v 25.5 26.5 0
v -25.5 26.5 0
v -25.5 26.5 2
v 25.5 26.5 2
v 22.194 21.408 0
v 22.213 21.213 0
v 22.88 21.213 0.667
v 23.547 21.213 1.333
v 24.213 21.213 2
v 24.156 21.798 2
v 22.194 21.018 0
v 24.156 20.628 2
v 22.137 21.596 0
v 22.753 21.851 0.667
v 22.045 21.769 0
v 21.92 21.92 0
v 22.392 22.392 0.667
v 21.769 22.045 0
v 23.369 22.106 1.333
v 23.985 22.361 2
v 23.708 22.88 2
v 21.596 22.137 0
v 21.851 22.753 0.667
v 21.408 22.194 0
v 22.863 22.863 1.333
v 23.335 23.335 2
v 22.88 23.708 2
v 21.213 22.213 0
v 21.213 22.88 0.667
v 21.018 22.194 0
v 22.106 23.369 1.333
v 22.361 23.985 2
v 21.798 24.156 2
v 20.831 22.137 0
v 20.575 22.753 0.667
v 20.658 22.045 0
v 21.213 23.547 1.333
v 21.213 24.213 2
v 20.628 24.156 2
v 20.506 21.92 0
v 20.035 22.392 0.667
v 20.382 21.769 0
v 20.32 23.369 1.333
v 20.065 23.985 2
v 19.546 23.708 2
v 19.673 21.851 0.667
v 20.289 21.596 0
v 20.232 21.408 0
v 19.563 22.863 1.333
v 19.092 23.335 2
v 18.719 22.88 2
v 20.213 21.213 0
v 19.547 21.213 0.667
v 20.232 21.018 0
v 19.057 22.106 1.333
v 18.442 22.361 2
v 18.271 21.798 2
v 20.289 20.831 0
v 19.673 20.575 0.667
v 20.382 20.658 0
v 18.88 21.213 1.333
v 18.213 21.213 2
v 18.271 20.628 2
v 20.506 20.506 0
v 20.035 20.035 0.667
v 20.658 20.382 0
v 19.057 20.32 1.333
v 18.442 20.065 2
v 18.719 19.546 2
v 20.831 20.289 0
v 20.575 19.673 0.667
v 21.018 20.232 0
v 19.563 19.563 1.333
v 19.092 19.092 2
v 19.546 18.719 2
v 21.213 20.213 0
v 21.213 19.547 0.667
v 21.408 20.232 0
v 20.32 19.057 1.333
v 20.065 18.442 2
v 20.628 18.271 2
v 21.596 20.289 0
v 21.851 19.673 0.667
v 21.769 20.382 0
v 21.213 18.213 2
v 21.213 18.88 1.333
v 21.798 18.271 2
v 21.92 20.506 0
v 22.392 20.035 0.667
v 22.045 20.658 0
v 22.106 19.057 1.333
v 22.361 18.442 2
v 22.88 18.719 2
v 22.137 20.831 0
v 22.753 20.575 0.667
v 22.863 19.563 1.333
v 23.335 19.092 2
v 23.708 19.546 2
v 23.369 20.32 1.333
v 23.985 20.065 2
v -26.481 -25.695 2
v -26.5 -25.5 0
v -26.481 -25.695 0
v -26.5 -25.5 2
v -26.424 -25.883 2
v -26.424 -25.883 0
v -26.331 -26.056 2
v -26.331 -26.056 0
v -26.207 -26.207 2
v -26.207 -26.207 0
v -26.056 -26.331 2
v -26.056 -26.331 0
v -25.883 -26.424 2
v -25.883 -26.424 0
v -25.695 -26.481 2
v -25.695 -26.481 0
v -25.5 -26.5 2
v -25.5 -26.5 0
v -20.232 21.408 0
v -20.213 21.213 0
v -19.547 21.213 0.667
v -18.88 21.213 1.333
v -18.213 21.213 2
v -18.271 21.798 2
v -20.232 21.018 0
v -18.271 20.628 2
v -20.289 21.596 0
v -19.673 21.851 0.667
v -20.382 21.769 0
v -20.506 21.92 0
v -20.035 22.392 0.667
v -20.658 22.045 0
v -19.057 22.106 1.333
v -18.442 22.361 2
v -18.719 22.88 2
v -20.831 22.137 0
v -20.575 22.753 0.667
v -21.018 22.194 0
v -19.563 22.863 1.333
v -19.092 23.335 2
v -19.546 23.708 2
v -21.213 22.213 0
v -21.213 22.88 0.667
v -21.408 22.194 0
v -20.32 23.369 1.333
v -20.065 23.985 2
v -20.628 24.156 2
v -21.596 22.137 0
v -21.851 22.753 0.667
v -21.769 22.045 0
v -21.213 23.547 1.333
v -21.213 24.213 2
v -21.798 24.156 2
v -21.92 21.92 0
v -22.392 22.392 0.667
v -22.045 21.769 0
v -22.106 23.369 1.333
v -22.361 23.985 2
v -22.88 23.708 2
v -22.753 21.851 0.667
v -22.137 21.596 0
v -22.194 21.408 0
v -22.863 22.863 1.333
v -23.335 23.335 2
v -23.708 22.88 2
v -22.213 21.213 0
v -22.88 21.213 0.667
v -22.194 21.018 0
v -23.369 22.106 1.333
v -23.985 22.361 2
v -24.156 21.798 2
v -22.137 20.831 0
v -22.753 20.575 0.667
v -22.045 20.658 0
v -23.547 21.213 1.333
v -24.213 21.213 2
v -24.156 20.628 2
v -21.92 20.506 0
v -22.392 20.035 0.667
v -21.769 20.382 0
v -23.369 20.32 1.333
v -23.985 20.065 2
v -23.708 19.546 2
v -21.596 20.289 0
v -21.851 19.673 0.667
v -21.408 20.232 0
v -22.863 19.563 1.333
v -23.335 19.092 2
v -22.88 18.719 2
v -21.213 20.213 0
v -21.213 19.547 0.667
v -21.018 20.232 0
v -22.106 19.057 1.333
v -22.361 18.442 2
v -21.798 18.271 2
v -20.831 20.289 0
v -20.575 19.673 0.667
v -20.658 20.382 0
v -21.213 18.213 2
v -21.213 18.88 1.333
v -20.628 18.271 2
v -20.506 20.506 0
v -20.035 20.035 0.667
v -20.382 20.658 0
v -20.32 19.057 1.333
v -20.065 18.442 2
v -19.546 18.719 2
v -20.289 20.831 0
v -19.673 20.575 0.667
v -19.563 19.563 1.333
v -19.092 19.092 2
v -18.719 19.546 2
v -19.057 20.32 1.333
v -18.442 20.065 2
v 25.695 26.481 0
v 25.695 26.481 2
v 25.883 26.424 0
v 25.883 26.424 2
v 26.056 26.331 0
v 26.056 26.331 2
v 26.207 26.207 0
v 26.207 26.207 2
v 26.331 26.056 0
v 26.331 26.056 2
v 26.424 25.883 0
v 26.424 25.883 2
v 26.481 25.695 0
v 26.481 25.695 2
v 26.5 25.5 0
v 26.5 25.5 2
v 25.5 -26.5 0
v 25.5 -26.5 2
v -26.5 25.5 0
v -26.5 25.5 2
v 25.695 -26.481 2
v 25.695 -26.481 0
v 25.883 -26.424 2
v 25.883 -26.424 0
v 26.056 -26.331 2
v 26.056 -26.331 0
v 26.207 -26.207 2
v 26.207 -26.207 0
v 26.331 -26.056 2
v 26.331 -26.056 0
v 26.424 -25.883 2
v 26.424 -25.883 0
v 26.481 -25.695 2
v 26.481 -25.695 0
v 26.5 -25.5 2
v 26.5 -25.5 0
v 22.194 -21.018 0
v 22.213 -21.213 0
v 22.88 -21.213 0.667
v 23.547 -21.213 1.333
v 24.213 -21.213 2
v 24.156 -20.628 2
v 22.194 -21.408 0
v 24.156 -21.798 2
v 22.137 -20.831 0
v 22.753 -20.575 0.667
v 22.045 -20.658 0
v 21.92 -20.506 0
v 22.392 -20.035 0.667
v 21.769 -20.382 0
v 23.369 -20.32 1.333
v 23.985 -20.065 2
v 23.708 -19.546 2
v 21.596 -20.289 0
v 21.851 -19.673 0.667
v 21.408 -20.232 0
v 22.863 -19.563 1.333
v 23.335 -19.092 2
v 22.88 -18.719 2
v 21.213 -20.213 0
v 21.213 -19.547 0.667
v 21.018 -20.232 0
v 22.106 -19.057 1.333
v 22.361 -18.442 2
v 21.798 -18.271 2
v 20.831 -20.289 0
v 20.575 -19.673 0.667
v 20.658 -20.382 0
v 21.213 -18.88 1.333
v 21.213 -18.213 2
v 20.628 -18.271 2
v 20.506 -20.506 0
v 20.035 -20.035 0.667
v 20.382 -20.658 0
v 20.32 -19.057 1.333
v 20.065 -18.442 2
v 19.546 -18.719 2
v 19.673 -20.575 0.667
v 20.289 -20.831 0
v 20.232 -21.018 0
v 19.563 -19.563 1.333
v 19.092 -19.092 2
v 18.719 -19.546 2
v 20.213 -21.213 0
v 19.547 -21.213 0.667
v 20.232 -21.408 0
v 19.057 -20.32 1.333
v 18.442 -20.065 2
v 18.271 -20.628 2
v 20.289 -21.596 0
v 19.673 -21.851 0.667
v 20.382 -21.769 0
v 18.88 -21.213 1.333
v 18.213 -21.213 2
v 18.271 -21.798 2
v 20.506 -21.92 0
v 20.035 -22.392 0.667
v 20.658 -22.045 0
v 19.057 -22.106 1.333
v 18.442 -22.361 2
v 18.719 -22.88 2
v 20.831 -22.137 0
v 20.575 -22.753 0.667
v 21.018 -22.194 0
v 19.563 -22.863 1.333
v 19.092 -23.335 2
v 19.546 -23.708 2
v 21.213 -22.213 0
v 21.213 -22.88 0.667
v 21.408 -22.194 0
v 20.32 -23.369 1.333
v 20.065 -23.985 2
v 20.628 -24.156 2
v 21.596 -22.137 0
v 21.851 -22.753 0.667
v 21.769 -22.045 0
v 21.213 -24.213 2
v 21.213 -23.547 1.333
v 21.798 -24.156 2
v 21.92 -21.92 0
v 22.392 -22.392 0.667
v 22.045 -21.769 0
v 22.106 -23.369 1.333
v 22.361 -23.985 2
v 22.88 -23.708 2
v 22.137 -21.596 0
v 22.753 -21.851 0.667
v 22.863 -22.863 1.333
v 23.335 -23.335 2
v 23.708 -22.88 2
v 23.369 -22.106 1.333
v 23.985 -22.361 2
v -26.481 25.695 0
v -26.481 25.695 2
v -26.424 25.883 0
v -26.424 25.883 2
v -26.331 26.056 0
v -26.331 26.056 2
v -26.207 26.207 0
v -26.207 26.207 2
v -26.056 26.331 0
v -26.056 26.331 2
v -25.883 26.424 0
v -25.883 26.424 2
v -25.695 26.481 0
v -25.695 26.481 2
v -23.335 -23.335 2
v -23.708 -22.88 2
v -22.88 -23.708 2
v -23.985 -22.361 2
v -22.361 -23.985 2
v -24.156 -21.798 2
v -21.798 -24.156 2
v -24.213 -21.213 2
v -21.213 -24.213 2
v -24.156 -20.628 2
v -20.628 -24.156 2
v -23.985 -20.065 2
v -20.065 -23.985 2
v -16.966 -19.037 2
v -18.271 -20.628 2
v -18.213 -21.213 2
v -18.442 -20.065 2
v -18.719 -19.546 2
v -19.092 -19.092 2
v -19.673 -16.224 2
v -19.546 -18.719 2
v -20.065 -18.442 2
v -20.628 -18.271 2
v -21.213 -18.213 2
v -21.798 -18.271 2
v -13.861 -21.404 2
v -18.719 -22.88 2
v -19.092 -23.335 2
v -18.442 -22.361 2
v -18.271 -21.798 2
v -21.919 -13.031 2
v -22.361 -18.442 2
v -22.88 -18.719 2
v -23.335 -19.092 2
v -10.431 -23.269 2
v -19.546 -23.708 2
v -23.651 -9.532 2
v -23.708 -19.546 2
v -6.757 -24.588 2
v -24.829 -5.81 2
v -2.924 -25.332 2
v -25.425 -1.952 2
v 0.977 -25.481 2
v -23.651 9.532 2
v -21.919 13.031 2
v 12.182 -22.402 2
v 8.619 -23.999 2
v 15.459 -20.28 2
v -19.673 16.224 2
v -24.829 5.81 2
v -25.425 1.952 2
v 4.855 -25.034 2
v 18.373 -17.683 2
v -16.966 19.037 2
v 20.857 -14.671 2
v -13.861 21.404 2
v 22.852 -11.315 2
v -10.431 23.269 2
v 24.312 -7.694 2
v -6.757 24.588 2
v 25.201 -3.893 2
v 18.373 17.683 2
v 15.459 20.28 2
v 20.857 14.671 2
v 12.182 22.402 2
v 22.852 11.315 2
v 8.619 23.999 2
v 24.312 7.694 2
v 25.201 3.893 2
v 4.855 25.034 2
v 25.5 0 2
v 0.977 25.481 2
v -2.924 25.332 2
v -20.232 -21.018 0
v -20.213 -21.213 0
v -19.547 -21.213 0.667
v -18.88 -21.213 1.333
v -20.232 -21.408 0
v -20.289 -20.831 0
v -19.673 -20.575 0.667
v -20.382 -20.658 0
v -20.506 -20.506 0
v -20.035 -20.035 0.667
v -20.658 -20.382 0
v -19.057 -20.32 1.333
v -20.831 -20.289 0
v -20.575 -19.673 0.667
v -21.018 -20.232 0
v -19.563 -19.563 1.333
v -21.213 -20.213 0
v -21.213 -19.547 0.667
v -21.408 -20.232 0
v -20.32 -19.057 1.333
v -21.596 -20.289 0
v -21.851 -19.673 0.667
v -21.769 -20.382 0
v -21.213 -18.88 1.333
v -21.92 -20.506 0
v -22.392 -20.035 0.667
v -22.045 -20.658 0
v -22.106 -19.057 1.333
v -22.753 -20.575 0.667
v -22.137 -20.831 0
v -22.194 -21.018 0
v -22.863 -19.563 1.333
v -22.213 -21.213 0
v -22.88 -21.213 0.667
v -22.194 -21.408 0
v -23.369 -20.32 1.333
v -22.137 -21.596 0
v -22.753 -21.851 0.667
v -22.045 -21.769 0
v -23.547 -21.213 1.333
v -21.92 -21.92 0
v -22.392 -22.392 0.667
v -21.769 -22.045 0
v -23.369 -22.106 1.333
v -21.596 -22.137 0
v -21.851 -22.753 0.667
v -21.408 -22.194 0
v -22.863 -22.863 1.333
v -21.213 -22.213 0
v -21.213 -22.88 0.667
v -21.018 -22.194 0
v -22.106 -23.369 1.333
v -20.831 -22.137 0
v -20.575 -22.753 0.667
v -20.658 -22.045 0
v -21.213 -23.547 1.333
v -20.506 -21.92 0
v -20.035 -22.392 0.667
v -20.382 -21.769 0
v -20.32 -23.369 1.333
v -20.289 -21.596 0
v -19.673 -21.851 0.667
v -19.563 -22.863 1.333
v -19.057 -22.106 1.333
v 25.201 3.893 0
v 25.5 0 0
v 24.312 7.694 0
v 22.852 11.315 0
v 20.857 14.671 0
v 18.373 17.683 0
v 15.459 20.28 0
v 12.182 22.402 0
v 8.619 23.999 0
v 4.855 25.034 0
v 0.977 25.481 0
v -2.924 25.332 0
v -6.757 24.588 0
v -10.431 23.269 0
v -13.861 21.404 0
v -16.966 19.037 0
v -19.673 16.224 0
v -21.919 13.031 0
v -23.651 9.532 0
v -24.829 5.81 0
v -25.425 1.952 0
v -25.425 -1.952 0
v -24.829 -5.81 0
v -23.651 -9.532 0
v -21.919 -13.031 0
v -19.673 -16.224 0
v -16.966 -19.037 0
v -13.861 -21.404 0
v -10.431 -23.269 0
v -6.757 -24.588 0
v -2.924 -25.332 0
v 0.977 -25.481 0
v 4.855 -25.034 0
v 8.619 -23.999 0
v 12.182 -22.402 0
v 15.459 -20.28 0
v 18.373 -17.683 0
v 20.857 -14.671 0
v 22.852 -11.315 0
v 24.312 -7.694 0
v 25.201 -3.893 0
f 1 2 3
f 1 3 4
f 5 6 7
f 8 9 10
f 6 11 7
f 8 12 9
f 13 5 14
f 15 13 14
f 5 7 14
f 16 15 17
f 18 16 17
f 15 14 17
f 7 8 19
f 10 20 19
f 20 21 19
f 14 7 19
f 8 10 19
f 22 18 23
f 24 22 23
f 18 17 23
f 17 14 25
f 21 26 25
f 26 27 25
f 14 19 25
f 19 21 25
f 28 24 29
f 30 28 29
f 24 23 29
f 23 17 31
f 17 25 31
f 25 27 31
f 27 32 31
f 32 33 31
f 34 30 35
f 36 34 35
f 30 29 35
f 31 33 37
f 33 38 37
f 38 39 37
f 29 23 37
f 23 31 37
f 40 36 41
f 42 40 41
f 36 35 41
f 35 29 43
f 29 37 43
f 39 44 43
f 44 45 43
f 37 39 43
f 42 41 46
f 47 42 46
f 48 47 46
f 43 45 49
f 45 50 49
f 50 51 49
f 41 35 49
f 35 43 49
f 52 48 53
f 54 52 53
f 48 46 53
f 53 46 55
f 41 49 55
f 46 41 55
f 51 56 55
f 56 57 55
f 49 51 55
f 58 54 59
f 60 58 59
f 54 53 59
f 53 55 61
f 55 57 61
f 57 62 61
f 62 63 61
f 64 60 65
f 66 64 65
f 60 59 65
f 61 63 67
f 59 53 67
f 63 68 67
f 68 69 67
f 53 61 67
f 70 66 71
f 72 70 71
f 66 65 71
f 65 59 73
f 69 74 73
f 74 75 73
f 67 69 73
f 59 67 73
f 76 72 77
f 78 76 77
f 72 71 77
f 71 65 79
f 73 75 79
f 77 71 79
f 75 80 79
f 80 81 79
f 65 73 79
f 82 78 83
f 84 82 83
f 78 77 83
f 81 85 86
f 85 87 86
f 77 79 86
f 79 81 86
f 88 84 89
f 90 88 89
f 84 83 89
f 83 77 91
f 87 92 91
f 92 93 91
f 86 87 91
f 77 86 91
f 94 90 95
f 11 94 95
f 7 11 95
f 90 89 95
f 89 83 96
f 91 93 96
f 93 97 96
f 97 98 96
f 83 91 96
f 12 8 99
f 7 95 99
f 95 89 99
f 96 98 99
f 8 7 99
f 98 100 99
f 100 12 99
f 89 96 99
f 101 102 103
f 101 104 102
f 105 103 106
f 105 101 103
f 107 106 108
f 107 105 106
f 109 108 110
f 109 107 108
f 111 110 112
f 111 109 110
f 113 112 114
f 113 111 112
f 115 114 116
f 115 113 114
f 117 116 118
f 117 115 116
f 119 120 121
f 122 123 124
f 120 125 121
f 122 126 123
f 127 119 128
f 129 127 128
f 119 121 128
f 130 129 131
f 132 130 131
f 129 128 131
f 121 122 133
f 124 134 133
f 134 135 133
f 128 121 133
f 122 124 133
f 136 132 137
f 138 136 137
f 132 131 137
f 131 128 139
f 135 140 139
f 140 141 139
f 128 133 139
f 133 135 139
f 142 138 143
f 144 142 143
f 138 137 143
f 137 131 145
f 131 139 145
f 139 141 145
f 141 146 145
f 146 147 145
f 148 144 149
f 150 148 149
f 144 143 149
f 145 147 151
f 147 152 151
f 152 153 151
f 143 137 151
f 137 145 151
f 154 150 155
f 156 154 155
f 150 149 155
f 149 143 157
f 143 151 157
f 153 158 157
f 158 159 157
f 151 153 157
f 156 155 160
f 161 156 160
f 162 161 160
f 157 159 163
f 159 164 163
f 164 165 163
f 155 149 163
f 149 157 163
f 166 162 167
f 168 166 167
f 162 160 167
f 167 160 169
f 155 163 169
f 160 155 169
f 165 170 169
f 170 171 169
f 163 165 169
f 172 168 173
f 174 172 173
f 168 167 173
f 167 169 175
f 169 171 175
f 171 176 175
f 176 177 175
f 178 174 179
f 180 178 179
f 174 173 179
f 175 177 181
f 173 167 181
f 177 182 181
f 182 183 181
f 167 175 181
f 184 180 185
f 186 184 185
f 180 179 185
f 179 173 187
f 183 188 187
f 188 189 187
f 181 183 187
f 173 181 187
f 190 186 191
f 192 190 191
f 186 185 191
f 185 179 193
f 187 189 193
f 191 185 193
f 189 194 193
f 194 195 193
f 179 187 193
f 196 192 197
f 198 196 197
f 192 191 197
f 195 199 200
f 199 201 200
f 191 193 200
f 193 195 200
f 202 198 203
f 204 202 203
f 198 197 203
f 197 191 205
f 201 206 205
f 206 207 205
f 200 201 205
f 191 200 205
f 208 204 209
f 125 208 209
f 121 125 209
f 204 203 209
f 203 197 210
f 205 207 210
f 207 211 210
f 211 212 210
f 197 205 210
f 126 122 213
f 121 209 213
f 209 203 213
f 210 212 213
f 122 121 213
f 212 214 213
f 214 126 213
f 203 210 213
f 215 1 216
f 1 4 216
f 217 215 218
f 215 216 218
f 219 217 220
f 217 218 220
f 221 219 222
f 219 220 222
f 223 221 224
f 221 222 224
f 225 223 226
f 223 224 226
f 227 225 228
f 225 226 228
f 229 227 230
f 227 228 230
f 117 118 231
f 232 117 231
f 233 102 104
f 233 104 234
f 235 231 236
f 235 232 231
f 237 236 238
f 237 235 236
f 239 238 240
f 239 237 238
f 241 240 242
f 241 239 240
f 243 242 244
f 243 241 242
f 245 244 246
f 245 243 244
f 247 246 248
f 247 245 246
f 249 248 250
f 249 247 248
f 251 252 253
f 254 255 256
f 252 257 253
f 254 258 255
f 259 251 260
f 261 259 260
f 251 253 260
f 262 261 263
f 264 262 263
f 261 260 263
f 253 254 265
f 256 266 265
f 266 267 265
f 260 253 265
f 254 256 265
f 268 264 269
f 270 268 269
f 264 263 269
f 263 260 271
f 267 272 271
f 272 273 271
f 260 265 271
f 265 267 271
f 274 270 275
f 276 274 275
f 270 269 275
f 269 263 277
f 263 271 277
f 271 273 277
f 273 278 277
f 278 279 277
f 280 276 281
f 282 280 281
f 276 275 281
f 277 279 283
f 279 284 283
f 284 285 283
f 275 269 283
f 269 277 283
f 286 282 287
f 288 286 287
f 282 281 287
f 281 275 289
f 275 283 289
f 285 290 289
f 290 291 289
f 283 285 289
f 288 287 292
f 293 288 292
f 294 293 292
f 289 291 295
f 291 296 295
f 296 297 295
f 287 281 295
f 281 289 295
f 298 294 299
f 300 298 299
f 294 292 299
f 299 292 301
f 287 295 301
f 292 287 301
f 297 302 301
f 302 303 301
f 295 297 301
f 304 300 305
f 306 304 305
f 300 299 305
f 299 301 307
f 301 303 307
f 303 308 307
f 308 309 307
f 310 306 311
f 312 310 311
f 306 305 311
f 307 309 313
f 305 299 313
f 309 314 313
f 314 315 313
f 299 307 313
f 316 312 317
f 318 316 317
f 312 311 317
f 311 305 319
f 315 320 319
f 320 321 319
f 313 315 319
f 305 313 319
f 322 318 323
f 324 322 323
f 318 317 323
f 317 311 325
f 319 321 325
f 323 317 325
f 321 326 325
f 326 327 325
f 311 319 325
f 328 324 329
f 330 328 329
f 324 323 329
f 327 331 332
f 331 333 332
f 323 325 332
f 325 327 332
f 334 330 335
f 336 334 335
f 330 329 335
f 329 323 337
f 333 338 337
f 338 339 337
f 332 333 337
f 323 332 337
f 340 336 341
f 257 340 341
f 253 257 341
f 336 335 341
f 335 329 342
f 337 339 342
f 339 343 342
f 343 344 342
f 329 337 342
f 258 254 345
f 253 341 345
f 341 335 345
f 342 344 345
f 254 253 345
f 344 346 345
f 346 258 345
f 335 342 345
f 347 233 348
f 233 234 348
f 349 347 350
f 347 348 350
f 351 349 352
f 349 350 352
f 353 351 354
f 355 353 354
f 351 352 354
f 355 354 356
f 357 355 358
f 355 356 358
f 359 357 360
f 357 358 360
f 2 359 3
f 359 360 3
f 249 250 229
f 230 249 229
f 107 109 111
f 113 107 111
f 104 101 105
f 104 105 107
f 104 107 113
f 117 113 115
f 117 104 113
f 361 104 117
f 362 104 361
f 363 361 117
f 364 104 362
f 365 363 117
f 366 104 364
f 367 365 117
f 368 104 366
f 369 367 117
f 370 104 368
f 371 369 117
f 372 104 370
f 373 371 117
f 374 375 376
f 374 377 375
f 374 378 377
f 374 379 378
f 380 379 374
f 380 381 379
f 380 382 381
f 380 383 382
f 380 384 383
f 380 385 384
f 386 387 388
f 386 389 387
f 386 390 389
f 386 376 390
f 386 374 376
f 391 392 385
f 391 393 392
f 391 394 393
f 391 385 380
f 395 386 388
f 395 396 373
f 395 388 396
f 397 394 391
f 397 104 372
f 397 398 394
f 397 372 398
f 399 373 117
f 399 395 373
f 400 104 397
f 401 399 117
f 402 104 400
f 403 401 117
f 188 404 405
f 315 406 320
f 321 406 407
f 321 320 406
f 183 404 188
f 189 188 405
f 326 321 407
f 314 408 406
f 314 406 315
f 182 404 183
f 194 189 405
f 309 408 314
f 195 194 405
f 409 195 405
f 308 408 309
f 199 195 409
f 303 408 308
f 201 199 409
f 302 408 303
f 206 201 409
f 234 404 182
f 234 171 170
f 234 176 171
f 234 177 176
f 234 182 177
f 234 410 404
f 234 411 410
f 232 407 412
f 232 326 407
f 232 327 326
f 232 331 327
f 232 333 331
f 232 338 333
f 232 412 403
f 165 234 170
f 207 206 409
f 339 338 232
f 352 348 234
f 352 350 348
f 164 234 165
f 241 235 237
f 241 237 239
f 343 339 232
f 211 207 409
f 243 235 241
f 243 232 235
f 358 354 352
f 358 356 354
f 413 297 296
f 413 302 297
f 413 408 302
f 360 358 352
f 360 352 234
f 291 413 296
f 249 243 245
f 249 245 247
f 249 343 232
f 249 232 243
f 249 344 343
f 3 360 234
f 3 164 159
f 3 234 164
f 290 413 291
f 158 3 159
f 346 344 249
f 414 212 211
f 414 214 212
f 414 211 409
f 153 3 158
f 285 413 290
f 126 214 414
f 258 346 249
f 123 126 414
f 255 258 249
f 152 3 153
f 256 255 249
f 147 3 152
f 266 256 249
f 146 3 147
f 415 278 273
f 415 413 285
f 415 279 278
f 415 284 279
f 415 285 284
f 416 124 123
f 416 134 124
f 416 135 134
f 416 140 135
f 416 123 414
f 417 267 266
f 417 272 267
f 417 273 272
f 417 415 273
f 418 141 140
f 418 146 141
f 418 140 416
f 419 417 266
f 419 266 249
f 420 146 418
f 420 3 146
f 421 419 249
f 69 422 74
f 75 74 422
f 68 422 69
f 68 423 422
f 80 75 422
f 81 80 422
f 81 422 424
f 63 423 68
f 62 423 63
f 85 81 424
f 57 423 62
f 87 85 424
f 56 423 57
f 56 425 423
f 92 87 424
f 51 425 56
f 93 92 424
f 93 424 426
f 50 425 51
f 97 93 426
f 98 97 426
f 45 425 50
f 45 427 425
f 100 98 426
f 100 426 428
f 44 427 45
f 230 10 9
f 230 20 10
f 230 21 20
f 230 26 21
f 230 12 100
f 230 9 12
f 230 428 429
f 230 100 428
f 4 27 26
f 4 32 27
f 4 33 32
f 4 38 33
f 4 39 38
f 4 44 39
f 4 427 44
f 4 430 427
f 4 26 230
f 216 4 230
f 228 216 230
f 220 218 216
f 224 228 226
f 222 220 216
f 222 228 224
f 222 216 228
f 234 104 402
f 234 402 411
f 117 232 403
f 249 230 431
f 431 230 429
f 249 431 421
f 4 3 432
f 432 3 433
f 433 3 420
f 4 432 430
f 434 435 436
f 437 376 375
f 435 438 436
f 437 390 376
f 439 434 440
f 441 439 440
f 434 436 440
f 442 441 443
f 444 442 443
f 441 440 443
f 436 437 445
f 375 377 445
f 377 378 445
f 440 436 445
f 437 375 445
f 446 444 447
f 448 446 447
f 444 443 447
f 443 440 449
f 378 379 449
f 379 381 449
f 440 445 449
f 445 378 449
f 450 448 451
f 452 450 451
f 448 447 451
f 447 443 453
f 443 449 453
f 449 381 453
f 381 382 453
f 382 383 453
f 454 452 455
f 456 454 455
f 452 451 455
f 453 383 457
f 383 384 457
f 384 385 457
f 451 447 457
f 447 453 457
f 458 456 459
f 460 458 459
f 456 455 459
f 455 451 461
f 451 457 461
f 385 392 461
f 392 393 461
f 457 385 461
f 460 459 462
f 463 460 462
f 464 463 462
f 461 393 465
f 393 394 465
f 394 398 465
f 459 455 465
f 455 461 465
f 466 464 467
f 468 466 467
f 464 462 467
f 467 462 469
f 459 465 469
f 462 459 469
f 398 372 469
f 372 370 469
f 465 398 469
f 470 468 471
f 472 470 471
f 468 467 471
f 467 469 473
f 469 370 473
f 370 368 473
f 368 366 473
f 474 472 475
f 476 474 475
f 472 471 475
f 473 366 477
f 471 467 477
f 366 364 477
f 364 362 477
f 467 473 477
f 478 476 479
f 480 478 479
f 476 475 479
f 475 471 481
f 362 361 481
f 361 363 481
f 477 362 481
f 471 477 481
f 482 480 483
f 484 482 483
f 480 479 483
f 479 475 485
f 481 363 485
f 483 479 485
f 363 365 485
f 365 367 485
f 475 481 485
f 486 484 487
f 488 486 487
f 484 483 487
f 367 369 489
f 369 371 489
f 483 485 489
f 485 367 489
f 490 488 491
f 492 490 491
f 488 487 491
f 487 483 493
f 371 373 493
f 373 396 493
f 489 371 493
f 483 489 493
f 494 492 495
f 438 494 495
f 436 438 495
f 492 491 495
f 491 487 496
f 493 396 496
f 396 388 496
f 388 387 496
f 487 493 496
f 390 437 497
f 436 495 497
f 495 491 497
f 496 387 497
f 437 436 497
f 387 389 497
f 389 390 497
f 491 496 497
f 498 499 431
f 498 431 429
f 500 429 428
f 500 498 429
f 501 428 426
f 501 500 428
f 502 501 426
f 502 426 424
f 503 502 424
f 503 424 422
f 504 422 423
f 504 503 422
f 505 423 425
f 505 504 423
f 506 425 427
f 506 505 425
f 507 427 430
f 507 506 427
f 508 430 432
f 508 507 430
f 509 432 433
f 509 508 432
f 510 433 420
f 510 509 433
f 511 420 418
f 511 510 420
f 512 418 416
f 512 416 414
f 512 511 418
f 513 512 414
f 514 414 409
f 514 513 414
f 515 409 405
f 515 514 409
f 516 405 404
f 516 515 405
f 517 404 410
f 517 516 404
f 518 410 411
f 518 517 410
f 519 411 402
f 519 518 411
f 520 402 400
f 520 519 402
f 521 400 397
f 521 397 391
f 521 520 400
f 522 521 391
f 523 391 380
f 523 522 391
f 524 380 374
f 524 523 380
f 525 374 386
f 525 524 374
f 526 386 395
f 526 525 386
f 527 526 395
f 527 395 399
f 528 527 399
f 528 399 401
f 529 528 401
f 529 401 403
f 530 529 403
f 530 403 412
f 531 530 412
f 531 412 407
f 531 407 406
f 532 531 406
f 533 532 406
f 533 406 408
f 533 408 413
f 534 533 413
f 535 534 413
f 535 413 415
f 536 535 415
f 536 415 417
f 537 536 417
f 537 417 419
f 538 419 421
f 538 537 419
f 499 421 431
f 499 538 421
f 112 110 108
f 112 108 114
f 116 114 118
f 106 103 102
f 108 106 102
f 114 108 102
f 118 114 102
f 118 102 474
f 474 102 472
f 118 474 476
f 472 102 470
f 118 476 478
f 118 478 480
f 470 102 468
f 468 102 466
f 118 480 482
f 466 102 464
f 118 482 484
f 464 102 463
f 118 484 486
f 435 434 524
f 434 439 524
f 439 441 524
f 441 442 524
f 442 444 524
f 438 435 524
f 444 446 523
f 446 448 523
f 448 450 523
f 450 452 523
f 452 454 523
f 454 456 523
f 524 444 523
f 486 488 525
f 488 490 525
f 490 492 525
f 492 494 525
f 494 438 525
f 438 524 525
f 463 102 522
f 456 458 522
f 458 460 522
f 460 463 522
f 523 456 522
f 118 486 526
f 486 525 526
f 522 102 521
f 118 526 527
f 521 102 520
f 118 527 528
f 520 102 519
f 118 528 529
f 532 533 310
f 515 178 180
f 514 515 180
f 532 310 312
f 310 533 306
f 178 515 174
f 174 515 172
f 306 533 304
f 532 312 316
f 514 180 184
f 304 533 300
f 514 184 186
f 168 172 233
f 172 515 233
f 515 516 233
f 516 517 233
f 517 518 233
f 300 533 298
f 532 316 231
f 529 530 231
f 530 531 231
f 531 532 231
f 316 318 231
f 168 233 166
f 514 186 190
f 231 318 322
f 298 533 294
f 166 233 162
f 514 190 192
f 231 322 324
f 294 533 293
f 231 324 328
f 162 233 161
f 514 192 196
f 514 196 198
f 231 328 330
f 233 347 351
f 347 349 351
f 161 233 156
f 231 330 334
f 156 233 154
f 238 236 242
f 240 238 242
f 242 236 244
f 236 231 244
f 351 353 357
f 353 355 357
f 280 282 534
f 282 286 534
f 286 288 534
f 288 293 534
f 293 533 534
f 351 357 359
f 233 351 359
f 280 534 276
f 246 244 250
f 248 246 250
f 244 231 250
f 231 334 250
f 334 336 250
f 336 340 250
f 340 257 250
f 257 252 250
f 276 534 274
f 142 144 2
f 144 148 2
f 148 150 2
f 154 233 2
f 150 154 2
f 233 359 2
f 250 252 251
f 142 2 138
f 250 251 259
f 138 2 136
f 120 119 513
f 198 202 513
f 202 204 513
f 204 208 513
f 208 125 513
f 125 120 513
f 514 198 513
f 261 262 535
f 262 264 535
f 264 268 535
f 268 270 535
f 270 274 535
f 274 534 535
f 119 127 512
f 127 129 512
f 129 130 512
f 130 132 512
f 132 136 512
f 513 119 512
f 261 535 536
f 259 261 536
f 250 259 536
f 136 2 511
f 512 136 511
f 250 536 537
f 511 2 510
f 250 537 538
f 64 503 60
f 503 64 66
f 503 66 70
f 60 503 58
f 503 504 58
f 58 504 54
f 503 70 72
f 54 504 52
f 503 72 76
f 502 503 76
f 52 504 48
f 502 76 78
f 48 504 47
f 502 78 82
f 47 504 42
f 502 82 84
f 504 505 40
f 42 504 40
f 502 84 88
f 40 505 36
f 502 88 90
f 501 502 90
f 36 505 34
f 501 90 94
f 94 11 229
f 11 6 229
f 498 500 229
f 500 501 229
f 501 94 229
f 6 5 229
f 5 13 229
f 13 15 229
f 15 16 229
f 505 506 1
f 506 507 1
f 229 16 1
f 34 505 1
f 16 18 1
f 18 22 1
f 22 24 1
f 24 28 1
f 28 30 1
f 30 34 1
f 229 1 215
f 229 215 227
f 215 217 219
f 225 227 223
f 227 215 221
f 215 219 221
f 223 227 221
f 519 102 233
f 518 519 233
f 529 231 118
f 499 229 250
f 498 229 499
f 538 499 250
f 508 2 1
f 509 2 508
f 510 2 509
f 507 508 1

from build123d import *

# Parameters (mm, degrees)
F0_W     = 53
F0_H     = 53
F0_R     = 1
F0_R_2   = 25.5
F1_DEPTH = 2
F2_SIZE  = 1.99999
F3_R     = 1


# Not quite as in the source:
# - a fillet or chamfer is up to 0.001 mm smaller than in the source, because OpenCascade refuses the exact size


with BuildPart() as f1:
    # F0 (on Top) → F1 (new body)
    with BuildSketch(Plane.XY):
        Rectangle(F0_W, F0_H)
        with Locations((-21.2132034356, -21.2132034356)):
            Circle(F0_R, mode=Mode.SUBTRACT)
        with Locations((21.2132034356, -21.2132034356)):
            Circle(F0_R, mode=Mode.SUBTRACT)
        with Locations((-21.2132034356, 21.2132034356)):
            Circle(F0_R, mode=Mode.SUBTRACT)
        Circle(F0_R_2, mode=Mode.SUBTRACT)
        with Locations((21.2132034356, 21.2132034356)):
            Circle(F0_R, mode=Mode.SUBTRACT)
    extrude(amount=F1_DEPTH)

    # F2 (size 2 in the source; OpenCascade refuses exactly that, so slightly less here)
    f2_edges = [f1.edges().sort_by_distance(p)[0] for p in [
        (-22.213203, 21.213203, 2),
        (20.213203, 21.213203, 2),
        (20.213203, -21.213203, 2),
        (-22.213203, -21.213203, 2),
    ]]
    chamfer(f2_edges, length=F2_SIZE)

    # F3
    f3_edges = [f1.edges().sort_by_distance(p)[0] for p in [
        (26.5, -26.5, 1),
        (26.5, 26.5, 1),
        (-26.5, -26.5, 1),
        (-26.5, 26.5, 1),
    ]]
    fillet(f3_edges, radius=F3_R)


solid = f1.part
